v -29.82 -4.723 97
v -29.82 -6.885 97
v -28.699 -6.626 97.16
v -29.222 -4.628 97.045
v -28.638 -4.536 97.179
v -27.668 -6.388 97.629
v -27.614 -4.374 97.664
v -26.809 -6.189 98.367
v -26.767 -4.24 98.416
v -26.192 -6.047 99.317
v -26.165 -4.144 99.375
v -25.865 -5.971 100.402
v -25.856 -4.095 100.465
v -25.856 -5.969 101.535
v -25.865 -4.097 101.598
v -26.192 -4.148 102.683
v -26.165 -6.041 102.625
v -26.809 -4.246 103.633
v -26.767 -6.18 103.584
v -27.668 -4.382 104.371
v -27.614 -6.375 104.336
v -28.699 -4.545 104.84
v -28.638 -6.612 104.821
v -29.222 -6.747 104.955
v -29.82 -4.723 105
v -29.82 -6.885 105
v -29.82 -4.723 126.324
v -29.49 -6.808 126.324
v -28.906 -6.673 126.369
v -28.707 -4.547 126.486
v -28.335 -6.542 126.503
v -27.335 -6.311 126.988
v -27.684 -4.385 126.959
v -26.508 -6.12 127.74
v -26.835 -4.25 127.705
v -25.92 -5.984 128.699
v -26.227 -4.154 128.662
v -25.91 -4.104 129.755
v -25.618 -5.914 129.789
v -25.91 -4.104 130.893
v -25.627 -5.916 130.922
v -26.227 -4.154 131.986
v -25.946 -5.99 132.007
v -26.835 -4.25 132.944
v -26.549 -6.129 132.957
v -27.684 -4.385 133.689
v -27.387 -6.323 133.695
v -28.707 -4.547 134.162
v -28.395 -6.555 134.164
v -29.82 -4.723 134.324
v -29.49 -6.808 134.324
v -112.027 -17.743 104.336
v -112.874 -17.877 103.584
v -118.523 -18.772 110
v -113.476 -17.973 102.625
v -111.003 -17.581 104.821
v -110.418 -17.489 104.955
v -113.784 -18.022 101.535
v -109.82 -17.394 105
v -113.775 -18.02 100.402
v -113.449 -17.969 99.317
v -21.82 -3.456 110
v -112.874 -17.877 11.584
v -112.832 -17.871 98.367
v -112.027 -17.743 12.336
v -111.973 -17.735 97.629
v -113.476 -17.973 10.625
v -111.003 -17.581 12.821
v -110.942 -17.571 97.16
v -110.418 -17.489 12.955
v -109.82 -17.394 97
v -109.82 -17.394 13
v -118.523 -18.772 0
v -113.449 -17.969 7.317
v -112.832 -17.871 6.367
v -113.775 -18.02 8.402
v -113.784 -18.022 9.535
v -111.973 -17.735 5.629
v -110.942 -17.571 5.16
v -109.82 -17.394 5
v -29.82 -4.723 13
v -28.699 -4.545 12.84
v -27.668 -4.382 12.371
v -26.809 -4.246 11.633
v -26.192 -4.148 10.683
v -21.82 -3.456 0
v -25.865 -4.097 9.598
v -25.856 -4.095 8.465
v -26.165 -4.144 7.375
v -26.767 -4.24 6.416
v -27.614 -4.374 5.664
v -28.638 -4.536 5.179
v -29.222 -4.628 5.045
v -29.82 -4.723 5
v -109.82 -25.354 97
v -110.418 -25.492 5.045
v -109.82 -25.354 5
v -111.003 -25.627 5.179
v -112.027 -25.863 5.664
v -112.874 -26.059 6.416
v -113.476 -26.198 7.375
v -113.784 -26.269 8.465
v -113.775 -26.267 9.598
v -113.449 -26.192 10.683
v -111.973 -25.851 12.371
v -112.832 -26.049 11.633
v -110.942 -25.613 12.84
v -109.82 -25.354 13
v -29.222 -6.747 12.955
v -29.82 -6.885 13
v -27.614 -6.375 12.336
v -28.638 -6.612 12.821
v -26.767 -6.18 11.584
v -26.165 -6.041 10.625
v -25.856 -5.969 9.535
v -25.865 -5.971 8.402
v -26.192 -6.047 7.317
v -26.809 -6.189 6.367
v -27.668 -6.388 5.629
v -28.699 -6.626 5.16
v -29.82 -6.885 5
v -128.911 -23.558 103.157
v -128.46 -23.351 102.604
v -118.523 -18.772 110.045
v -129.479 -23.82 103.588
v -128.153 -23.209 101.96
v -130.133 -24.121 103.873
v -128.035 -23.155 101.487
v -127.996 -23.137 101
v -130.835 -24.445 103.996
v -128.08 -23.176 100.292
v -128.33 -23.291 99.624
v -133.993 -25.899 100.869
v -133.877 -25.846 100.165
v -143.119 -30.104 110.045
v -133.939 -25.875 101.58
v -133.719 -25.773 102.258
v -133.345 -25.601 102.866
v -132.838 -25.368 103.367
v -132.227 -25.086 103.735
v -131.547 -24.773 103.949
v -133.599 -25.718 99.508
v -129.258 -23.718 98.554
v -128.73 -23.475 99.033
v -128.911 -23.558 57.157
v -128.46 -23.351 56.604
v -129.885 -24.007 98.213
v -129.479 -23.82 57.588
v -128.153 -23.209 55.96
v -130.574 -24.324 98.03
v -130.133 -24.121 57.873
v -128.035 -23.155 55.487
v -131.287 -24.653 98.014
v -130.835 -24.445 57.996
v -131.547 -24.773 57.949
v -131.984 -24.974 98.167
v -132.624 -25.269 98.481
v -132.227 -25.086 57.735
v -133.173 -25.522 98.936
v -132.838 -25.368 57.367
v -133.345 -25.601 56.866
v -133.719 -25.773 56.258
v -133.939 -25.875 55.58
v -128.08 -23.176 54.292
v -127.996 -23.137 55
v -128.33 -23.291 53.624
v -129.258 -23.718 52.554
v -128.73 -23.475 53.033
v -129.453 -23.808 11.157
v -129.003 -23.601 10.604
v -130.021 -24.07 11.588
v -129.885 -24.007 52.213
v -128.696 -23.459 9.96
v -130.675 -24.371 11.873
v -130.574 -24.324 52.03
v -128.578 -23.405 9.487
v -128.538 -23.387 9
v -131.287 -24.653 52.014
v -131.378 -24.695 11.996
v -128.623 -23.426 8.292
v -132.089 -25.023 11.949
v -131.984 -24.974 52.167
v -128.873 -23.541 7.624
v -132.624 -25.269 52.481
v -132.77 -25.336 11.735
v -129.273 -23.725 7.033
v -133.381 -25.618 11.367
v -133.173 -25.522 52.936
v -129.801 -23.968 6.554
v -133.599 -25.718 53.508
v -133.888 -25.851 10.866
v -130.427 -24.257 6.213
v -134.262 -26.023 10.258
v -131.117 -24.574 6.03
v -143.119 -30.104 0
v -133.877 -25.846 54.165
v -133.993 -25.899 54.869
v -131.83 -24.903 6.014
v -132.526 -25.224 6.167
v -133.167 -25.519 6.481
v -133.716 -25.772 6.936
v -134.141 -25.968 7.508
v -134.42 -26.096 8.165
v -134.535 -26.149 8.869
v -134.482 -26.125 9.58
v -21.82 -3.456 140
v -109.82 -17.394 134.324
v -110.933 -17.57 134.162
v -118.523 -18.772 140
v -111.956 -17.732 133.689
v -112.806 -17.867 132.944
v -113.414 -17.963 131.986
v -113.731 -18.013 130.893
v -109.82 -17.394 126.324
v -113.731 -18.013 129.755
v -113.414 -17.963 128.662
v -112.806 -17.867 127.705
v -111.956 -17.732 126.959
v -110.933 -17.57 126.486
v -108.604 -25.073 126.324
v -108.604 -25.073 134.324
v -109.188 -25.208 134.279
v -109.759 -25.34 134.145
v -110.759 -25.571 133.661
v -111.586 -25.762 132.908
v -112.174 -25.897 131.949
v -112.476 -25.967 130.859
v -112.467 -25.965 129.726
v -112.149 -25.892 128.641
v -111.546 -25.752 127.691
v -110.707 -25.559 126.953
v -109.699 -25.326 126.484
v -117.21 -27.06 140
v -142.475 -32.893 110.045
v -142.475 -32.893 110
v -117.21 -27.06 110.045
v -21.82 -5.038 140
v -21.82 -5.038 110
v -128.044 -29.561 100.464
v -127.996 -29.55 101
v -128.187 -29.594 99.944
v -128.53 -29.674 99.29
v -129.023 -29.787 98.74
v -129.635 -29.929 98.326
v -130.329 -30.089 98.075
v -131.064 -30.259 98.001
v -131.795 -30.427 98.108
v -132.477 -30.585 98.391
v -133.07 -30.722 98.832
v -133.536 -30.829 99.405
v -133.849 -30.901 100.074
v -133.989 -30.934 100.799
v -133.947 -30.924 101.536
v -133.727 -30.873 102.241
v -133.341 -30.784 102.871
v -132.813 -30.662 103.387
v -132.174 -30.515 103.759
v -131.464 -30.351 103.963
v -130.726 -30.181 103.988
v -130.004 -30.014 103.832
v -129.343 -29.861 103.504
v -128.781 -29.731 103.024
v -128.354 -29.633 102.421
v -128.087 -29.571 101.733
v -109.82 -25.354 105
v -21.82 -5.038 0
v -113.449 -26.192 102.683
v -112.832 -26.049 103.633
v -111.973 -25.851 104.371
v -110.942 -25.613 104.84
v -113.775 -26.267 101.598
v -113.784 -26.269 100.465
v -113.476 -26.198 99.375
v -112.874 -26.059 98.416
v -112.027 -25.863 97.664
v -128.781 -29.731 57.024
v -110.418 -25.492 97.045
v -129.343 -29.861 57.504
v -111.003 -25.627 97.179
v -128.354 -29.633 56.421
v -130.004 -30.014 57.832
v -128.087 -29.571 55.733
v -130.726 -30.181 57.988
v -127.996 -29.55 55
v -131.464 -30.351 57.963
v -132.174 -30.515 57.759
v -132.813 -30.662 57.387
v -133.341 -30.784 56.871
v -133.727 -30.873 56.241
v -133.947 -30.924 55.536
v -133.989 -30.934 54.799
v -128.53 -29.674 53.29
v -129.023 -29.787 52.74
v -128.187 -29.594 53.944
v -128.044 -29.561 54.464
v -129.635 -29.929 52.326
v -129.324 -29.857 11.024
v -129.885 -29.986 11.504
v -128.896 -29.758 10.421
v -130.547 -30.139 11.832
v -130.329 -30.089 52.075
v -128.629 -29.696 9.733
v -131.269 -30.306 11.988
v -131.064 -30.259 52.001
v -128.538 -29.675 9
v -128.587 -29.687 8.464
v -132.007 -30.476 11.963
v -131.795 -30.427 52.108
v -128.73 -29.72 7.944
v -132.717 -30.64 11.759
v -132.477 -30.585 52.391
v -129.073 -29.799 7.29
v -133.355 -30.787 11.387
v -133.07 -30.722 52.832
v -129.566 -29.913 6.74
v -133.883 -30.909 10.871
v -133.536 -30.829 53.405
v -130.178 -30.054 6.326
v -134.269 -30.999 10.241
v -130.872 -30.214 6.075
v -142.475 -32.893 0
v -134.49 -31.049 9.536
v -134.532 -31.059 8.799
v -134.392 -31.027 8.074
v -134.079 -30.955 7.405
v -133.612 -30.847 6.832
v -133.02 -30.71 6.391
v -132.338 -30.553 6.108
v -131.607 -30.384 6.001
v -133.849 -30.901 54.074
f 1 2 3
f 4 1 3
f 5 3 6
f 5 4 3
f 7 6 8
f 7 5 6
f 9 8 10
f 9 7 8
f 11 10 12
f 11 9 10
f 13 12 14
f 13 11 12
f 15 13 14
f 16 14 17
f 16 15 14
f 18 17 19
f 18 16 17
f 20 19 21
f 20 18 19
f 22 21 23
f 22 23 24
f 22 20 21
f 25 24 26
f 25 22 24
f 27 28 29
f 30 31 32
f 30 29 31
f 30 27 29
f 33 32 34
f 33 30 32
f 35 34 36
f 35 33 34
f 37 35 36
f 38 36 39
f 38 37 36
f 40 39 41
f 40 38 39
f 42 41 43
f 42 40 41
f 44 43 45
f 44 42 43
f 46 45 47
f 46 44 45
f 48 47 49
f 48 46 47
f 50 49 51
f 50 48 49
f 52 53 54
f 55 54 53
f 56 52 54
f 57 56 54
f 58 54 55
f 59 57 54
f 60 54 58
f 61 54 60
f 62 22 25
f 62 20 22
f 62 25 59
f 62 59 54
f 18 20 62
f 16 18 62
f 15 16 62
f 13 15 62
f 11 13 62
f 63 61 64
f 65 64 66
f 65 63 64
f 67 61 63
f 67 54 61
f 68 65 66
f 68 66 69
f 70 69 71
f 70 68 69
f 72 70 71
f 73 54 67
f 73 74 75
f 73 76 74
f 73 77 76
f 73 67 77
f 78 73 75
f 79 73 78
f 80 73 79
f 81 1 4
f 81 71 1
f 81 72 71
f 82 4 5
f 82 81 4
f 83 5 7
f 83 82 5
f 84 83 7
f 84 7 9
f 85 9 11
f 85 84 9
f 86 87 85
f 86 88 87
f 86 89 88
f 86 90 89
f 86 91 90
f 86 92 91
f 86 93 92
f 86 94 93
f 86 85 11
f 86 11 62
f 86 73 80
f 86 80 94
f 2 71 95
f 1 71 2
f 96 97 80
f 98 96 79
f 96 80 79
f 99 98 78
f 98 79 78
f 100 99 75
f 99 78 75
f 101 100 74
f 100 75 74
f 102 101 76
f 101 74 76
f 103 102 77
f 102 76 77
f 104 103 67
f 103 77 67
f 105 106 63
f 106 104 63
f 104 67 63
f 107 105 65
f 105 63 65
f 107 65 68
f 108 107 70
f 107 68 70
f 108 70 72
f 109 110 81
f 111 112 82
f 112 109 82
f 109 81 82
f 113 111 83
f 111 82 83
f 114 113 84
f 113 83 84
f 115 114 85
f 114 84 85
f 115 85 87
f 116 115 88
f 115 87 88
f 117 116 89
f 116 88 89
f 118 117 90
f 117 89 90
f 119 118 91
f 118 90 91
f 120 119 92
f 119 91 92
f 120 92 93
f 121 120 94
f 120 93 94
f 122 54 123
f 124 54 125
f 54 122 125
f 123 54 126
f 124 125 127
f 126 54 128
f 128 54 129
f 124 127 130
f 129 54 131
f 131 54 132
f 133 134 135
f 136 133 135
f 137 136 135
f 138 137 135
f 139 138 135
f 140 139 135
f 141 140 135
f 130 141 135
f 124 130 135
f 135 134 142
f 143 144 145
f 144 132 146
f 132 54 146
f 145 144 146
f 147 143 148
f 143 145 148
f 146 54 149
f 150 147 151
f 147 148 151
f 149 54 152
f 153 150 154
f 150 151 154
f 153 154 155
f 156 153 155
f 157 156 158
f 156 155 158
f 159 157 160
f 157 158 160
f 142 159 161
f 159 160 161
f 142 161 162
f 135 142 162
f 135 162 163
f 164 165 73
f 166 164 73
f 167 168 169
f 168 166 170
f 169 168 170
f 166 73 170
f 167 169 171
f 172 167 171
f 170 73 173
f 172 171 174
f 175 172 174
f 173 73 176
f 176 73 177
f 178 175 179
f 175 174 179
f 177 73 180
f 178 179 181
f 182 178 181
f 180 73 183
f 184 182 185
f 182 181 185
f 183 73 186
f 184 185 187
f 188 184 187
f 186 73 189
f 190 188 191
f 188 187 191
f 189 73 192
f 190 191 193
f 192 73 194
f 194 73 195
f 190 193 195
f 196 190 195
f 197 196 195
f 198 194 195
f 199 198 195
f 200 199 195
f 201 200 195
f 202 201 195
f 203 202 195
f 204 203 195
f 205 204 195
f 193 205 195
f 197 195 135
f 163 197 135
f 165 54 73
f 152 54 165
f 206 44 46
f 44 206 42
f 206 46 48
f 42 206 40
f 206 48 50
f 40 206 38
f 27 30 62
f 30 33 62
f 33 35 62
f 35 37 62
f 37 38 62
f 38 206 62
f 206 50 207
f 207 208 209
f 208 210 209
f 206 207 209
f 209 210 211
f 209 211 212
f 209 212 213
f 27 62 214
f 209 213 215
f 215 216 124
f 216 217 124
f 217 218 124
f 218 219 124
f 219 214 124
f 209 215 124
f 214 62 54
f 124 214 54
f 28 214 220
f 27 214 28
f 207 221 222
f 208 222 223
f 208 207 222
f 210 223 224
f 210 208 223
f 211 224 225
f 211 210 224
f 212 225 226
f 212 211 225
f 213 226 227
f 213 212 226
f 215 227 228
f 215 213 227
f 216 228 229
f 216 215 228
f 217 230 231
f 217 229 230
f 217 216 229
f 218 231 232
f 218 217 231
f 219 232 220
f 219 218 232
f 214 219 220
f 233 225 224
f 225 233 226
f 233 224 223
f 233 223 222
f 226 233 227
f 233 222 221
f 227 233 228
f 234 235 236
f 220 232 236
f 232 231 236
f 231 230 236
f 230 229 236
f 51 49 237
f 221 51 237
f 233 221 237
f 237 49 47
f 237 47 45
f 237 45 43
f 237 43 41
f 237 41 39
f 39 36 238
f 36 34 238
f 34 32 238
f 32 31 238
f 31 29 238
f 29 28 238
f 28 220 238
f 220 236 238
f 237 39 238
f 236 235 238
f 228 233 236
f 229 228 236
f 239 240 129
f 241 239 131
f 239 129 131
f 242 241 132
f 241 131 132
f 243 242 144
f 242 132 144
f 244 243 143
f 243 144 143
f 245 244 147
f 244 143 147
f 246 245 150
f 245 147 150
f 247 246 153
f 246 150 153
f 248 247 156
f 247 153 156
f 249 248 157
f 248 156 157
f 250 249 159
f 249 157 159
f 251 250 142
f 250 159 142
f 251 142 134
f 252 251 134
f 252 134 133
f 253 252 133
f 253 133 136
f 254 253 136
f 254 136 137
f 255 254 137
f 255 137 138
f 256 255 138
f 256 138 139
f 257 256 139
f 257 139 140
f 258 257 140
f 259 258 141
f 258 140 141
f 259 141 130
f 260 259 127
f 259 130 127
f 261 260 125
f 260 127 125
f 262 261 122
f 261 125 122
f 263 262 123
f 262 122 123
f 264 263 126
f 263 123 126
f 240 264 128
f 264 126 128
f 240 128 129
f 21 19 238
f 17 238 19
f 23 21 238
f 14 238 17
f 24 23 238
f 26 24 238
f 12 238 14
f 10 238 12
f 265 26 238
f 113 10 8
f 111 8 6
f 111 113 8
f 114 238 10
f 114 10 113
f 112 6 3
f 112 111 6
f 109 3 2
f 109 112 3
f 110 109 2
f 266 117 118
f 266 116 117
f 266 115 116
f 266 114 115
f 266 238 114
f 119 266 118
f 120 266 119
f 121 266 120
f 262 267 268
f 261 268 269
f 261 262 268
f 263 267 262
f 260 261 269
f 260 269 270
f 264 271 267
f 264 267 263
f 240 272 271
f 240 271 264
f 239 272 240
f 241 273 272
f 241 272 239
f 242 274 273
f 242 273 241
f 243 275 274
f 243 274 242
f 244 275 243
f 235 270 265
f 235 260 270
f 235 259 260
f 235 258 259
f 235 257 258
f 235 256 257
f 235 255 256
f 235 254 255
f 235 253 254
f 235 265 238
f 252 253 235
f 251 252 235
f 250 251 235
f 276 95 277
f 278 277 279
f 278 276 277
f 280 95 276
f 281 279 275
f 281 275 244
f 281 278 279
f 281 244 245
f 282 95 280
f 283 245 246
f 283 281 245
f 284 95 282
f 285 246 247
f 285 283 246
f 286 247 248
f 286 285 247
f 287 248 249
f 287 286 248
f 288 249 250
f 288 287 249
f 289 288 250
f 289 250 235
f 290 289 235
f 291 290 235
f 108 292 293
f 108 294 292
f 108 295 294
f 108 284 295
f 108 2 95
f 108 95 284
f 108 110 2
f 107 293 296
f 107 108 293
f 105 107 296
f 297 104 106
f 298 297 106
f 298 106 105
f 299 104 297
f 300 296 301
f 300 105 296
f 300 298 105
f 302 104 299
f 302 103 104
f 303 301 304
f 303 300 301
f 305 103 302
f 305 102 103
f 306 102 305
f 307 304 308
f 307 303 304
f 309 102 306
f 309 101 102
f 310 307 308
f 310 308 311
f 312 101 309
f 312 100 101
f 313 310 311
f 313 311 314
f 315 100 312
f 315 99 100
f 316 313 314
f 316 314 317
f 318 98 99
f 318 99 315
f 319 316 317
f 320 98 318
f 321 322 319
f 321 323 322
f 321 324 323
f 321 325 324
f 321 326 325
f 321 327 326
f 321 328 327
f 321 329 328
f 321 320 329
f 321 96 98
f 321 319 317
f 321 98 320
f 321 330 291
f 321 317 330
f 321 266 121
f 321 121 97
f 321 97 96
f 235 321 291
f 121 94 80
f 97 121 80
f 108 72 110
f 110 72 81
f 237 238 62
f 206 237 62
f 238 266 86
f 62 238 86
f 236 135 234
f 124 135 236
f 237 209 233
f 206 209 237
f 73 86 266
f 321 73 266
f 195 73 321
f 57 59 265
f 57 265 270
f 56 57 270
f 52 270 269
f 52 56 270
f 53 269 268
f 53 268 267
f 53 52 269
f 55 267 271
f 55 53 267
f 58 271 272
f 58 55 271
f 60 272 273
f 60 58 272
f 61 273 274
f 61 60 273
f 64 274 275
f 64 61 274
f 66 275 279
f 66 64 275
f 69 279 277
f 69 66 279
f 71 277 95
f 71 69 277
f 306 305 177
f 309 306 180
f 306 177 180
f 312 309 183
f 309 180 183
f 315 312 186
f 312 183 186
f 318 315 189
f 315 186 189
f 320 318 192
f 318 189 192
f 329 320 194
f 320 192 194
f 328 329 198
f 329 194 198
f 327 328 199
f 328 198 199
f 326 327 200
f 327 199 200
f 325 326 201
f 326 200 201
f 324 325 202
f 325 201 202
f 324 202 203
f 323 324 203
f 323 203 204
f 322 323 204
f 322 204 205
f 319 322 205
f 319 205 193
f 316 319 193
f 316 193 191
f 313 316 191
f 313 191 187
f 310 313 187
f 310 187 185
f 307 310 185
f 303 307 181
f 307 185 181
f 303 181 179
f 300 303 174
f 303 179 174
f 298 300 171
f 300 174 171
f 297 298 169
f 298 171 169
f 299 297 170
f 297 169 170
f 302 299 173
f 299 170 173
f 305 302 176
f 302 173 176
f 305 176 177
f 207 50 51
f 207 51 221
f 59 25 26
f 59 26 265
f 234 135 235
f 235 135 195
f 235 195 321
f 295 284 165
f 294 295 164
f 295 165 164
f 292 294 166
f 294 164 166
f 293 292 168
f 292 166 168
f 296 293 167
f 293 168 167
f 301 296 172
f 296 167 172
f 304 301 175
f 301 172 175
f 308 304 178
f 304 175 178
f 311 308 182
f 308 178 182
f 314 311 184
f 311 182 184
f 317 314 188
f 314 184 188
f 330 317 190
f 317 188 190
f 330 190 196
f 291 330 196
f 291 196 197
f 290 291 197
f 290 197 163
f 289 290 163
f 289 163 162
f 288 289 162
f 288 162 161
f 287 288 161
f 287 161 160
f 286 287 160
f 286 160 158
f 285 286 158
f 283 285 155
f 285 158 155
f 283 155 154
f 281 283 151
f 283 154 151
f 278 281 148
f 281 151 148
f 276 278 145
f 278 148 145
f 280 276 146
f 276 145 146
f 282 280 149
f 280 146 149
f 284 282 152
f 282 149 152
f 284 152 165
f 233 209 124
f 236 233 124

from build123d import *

# Parameters (mm, degrees)
BOSS_EXTRUDE1_DEPTH     = 110
CUT_EXTRUDE1_DEPTH      = 1
CUT_EXTRUDE1_DEPTH_BACK = 111
SKETCH4_R               = 3
CUT_EXTRUDE2_DEPTH      = 1
CUT_EXTRUDE2_DEPTH_BACK = 43.893018073
BOSS_EXTRUDE2_DEPTH     = 30
SKETCH6_W               = 26.1276751
SKETCH6_H               = 29.954556473
CUT_EXTRUDE3_DEPTH      = 19.975306871
CUT_EXTRUDE3_DEPTH_BACK = 30.07458706


with BuildPart() as part:
    # Sketch1 → Boss-Extrude1 (new body)
    with BuildSketch(Plane.XY):
        Polygon((0, 0), (-142.475314215, -32.893018073), (-143.119166497, -30.104187448), (-118.522600871, -18.772135805), align=None)
    extrude(amount=BOSS_EXTRUDE1_DEPTH)

    # Sketch2 → Cut-Extrude1 (cut, two sides)
    with BuildSketch(Plane.XY.offset(110)) as cut_extrude1_sk:
        Polygon((-21.820404963, -3.456012628), (-21.820404963, -5.037637423), (0, 0), align=None)
    extrude(amount=CUT_EXTRUDE1_DEPTH, mode=Mode.SUBTRACT)
    extrude(cut_extrude1_sk.sketch, amount=-CUT_EXTRUDE1_DEPTH_BACK, mode=Mode.SUBTRACT)

    # Sketch4 → Cut-Extrude2 (cut, two sides)
    with BuildSketch(Plane(origin=(0, 10, 0), x_dir=(1, 0, 0), z_dir=(0, 1, 0))) as cut_extrude2_sk:
        with Locations((-130.995623221, -101)):
            Circle(SKETCH4_R)
        with Locations((-131.538244407, -9)):
            Circle(SKETCH4_R)
        with Locations((-130.995623221, -55)):
            Circle(SKETCH4_R)
        with BuildLine():
            Line((-29.820404963, -105), (-109.820404963, -105))
            ThreePointArc((-109.820404963, -105), (-113.820404963, -101), (-109.820404963, -97))
            Line((-109.820404963, -97), (-29.820404963, -97))
            ThreePointArc((-29.820404963, -97), (-25.820404963, -101), (-29.820404963, -105))
        make_face()
        with BuildLine():
            Line((-29.820404963, -5), (-109.820404963, -5))
            ThreePointArc((-109.820404963, -5), (-113.820404963, -9), (-109.820404963, -13))
            Line((-109.820404963, -13), (-29.820404963, -13))
            ThreePointArc((-29.820404963, -13), (-25.820404963, -9), (-29.820404963, -5))
        make_face()
    extrude(amount=CUT_EXTRUDE2_DEPTH, mode=Mode.SUBTRACT)
    extrude(cut_extrude2_sk.sketch, amount=-CUT_EXTRUDE2_DEPTH_BACK, mode=Mode.SUBTRACT)

    # Sketch5 → Boss-Extrude2 (add)
    with BuildSketch(Plane.XY.offset(110)):
        Polygon((-142.475314215, -32.893018073), (-21.820404963, -5.037637423), (-21.820404963, -3.456012628), (-118.522600871, -18.772135805), (-143.119166497, -30.104187448), align=None)
    extrude(amount=BOSS_EXTRUDE2_DEPTH)

    # Sketch6 → Cut-Extrude3 (cut, two sides)
    with BuildSketch(Plane(origin=(0, 0, 0), x_dir=(0.987688341, 0.156434465, 0), z_dir=(-0.156434465, 0.987688341, 0))) as cut_extrude3_sk:
        with BuildLine():
            Line((-30.192120061, -134.324079108), (-111.189330125, -134.324079108))
            ThreePointArc((-111.189330125, -134.324079108), (-115.189330125, -130.324079108), (-111.189330125, -126.324079108))
            Line((-111.189330125, -126.324079108), (-30.192120061, -126.324079108))
            ThreePointArc((-30.192120061, -126.324079108), (-26.192120061, -130.324079108), (-30.192120061, -134.324079108))
        make_face()
        with Locations((-133.06383755, -125.022721764)):
            Rectangle(SKETCH6_W, SKETCH6_H)
    extrude(amount=CUT_EXTRUDE3_DEPTH, mode=Mode.SUBTRACT)
    extrude(cut_extrude3_sk.sketch, amount=-CUT_EXTRUDE3_DEPTH_BACK, mode=Mode.SUBTRACT)


solid = part.part
